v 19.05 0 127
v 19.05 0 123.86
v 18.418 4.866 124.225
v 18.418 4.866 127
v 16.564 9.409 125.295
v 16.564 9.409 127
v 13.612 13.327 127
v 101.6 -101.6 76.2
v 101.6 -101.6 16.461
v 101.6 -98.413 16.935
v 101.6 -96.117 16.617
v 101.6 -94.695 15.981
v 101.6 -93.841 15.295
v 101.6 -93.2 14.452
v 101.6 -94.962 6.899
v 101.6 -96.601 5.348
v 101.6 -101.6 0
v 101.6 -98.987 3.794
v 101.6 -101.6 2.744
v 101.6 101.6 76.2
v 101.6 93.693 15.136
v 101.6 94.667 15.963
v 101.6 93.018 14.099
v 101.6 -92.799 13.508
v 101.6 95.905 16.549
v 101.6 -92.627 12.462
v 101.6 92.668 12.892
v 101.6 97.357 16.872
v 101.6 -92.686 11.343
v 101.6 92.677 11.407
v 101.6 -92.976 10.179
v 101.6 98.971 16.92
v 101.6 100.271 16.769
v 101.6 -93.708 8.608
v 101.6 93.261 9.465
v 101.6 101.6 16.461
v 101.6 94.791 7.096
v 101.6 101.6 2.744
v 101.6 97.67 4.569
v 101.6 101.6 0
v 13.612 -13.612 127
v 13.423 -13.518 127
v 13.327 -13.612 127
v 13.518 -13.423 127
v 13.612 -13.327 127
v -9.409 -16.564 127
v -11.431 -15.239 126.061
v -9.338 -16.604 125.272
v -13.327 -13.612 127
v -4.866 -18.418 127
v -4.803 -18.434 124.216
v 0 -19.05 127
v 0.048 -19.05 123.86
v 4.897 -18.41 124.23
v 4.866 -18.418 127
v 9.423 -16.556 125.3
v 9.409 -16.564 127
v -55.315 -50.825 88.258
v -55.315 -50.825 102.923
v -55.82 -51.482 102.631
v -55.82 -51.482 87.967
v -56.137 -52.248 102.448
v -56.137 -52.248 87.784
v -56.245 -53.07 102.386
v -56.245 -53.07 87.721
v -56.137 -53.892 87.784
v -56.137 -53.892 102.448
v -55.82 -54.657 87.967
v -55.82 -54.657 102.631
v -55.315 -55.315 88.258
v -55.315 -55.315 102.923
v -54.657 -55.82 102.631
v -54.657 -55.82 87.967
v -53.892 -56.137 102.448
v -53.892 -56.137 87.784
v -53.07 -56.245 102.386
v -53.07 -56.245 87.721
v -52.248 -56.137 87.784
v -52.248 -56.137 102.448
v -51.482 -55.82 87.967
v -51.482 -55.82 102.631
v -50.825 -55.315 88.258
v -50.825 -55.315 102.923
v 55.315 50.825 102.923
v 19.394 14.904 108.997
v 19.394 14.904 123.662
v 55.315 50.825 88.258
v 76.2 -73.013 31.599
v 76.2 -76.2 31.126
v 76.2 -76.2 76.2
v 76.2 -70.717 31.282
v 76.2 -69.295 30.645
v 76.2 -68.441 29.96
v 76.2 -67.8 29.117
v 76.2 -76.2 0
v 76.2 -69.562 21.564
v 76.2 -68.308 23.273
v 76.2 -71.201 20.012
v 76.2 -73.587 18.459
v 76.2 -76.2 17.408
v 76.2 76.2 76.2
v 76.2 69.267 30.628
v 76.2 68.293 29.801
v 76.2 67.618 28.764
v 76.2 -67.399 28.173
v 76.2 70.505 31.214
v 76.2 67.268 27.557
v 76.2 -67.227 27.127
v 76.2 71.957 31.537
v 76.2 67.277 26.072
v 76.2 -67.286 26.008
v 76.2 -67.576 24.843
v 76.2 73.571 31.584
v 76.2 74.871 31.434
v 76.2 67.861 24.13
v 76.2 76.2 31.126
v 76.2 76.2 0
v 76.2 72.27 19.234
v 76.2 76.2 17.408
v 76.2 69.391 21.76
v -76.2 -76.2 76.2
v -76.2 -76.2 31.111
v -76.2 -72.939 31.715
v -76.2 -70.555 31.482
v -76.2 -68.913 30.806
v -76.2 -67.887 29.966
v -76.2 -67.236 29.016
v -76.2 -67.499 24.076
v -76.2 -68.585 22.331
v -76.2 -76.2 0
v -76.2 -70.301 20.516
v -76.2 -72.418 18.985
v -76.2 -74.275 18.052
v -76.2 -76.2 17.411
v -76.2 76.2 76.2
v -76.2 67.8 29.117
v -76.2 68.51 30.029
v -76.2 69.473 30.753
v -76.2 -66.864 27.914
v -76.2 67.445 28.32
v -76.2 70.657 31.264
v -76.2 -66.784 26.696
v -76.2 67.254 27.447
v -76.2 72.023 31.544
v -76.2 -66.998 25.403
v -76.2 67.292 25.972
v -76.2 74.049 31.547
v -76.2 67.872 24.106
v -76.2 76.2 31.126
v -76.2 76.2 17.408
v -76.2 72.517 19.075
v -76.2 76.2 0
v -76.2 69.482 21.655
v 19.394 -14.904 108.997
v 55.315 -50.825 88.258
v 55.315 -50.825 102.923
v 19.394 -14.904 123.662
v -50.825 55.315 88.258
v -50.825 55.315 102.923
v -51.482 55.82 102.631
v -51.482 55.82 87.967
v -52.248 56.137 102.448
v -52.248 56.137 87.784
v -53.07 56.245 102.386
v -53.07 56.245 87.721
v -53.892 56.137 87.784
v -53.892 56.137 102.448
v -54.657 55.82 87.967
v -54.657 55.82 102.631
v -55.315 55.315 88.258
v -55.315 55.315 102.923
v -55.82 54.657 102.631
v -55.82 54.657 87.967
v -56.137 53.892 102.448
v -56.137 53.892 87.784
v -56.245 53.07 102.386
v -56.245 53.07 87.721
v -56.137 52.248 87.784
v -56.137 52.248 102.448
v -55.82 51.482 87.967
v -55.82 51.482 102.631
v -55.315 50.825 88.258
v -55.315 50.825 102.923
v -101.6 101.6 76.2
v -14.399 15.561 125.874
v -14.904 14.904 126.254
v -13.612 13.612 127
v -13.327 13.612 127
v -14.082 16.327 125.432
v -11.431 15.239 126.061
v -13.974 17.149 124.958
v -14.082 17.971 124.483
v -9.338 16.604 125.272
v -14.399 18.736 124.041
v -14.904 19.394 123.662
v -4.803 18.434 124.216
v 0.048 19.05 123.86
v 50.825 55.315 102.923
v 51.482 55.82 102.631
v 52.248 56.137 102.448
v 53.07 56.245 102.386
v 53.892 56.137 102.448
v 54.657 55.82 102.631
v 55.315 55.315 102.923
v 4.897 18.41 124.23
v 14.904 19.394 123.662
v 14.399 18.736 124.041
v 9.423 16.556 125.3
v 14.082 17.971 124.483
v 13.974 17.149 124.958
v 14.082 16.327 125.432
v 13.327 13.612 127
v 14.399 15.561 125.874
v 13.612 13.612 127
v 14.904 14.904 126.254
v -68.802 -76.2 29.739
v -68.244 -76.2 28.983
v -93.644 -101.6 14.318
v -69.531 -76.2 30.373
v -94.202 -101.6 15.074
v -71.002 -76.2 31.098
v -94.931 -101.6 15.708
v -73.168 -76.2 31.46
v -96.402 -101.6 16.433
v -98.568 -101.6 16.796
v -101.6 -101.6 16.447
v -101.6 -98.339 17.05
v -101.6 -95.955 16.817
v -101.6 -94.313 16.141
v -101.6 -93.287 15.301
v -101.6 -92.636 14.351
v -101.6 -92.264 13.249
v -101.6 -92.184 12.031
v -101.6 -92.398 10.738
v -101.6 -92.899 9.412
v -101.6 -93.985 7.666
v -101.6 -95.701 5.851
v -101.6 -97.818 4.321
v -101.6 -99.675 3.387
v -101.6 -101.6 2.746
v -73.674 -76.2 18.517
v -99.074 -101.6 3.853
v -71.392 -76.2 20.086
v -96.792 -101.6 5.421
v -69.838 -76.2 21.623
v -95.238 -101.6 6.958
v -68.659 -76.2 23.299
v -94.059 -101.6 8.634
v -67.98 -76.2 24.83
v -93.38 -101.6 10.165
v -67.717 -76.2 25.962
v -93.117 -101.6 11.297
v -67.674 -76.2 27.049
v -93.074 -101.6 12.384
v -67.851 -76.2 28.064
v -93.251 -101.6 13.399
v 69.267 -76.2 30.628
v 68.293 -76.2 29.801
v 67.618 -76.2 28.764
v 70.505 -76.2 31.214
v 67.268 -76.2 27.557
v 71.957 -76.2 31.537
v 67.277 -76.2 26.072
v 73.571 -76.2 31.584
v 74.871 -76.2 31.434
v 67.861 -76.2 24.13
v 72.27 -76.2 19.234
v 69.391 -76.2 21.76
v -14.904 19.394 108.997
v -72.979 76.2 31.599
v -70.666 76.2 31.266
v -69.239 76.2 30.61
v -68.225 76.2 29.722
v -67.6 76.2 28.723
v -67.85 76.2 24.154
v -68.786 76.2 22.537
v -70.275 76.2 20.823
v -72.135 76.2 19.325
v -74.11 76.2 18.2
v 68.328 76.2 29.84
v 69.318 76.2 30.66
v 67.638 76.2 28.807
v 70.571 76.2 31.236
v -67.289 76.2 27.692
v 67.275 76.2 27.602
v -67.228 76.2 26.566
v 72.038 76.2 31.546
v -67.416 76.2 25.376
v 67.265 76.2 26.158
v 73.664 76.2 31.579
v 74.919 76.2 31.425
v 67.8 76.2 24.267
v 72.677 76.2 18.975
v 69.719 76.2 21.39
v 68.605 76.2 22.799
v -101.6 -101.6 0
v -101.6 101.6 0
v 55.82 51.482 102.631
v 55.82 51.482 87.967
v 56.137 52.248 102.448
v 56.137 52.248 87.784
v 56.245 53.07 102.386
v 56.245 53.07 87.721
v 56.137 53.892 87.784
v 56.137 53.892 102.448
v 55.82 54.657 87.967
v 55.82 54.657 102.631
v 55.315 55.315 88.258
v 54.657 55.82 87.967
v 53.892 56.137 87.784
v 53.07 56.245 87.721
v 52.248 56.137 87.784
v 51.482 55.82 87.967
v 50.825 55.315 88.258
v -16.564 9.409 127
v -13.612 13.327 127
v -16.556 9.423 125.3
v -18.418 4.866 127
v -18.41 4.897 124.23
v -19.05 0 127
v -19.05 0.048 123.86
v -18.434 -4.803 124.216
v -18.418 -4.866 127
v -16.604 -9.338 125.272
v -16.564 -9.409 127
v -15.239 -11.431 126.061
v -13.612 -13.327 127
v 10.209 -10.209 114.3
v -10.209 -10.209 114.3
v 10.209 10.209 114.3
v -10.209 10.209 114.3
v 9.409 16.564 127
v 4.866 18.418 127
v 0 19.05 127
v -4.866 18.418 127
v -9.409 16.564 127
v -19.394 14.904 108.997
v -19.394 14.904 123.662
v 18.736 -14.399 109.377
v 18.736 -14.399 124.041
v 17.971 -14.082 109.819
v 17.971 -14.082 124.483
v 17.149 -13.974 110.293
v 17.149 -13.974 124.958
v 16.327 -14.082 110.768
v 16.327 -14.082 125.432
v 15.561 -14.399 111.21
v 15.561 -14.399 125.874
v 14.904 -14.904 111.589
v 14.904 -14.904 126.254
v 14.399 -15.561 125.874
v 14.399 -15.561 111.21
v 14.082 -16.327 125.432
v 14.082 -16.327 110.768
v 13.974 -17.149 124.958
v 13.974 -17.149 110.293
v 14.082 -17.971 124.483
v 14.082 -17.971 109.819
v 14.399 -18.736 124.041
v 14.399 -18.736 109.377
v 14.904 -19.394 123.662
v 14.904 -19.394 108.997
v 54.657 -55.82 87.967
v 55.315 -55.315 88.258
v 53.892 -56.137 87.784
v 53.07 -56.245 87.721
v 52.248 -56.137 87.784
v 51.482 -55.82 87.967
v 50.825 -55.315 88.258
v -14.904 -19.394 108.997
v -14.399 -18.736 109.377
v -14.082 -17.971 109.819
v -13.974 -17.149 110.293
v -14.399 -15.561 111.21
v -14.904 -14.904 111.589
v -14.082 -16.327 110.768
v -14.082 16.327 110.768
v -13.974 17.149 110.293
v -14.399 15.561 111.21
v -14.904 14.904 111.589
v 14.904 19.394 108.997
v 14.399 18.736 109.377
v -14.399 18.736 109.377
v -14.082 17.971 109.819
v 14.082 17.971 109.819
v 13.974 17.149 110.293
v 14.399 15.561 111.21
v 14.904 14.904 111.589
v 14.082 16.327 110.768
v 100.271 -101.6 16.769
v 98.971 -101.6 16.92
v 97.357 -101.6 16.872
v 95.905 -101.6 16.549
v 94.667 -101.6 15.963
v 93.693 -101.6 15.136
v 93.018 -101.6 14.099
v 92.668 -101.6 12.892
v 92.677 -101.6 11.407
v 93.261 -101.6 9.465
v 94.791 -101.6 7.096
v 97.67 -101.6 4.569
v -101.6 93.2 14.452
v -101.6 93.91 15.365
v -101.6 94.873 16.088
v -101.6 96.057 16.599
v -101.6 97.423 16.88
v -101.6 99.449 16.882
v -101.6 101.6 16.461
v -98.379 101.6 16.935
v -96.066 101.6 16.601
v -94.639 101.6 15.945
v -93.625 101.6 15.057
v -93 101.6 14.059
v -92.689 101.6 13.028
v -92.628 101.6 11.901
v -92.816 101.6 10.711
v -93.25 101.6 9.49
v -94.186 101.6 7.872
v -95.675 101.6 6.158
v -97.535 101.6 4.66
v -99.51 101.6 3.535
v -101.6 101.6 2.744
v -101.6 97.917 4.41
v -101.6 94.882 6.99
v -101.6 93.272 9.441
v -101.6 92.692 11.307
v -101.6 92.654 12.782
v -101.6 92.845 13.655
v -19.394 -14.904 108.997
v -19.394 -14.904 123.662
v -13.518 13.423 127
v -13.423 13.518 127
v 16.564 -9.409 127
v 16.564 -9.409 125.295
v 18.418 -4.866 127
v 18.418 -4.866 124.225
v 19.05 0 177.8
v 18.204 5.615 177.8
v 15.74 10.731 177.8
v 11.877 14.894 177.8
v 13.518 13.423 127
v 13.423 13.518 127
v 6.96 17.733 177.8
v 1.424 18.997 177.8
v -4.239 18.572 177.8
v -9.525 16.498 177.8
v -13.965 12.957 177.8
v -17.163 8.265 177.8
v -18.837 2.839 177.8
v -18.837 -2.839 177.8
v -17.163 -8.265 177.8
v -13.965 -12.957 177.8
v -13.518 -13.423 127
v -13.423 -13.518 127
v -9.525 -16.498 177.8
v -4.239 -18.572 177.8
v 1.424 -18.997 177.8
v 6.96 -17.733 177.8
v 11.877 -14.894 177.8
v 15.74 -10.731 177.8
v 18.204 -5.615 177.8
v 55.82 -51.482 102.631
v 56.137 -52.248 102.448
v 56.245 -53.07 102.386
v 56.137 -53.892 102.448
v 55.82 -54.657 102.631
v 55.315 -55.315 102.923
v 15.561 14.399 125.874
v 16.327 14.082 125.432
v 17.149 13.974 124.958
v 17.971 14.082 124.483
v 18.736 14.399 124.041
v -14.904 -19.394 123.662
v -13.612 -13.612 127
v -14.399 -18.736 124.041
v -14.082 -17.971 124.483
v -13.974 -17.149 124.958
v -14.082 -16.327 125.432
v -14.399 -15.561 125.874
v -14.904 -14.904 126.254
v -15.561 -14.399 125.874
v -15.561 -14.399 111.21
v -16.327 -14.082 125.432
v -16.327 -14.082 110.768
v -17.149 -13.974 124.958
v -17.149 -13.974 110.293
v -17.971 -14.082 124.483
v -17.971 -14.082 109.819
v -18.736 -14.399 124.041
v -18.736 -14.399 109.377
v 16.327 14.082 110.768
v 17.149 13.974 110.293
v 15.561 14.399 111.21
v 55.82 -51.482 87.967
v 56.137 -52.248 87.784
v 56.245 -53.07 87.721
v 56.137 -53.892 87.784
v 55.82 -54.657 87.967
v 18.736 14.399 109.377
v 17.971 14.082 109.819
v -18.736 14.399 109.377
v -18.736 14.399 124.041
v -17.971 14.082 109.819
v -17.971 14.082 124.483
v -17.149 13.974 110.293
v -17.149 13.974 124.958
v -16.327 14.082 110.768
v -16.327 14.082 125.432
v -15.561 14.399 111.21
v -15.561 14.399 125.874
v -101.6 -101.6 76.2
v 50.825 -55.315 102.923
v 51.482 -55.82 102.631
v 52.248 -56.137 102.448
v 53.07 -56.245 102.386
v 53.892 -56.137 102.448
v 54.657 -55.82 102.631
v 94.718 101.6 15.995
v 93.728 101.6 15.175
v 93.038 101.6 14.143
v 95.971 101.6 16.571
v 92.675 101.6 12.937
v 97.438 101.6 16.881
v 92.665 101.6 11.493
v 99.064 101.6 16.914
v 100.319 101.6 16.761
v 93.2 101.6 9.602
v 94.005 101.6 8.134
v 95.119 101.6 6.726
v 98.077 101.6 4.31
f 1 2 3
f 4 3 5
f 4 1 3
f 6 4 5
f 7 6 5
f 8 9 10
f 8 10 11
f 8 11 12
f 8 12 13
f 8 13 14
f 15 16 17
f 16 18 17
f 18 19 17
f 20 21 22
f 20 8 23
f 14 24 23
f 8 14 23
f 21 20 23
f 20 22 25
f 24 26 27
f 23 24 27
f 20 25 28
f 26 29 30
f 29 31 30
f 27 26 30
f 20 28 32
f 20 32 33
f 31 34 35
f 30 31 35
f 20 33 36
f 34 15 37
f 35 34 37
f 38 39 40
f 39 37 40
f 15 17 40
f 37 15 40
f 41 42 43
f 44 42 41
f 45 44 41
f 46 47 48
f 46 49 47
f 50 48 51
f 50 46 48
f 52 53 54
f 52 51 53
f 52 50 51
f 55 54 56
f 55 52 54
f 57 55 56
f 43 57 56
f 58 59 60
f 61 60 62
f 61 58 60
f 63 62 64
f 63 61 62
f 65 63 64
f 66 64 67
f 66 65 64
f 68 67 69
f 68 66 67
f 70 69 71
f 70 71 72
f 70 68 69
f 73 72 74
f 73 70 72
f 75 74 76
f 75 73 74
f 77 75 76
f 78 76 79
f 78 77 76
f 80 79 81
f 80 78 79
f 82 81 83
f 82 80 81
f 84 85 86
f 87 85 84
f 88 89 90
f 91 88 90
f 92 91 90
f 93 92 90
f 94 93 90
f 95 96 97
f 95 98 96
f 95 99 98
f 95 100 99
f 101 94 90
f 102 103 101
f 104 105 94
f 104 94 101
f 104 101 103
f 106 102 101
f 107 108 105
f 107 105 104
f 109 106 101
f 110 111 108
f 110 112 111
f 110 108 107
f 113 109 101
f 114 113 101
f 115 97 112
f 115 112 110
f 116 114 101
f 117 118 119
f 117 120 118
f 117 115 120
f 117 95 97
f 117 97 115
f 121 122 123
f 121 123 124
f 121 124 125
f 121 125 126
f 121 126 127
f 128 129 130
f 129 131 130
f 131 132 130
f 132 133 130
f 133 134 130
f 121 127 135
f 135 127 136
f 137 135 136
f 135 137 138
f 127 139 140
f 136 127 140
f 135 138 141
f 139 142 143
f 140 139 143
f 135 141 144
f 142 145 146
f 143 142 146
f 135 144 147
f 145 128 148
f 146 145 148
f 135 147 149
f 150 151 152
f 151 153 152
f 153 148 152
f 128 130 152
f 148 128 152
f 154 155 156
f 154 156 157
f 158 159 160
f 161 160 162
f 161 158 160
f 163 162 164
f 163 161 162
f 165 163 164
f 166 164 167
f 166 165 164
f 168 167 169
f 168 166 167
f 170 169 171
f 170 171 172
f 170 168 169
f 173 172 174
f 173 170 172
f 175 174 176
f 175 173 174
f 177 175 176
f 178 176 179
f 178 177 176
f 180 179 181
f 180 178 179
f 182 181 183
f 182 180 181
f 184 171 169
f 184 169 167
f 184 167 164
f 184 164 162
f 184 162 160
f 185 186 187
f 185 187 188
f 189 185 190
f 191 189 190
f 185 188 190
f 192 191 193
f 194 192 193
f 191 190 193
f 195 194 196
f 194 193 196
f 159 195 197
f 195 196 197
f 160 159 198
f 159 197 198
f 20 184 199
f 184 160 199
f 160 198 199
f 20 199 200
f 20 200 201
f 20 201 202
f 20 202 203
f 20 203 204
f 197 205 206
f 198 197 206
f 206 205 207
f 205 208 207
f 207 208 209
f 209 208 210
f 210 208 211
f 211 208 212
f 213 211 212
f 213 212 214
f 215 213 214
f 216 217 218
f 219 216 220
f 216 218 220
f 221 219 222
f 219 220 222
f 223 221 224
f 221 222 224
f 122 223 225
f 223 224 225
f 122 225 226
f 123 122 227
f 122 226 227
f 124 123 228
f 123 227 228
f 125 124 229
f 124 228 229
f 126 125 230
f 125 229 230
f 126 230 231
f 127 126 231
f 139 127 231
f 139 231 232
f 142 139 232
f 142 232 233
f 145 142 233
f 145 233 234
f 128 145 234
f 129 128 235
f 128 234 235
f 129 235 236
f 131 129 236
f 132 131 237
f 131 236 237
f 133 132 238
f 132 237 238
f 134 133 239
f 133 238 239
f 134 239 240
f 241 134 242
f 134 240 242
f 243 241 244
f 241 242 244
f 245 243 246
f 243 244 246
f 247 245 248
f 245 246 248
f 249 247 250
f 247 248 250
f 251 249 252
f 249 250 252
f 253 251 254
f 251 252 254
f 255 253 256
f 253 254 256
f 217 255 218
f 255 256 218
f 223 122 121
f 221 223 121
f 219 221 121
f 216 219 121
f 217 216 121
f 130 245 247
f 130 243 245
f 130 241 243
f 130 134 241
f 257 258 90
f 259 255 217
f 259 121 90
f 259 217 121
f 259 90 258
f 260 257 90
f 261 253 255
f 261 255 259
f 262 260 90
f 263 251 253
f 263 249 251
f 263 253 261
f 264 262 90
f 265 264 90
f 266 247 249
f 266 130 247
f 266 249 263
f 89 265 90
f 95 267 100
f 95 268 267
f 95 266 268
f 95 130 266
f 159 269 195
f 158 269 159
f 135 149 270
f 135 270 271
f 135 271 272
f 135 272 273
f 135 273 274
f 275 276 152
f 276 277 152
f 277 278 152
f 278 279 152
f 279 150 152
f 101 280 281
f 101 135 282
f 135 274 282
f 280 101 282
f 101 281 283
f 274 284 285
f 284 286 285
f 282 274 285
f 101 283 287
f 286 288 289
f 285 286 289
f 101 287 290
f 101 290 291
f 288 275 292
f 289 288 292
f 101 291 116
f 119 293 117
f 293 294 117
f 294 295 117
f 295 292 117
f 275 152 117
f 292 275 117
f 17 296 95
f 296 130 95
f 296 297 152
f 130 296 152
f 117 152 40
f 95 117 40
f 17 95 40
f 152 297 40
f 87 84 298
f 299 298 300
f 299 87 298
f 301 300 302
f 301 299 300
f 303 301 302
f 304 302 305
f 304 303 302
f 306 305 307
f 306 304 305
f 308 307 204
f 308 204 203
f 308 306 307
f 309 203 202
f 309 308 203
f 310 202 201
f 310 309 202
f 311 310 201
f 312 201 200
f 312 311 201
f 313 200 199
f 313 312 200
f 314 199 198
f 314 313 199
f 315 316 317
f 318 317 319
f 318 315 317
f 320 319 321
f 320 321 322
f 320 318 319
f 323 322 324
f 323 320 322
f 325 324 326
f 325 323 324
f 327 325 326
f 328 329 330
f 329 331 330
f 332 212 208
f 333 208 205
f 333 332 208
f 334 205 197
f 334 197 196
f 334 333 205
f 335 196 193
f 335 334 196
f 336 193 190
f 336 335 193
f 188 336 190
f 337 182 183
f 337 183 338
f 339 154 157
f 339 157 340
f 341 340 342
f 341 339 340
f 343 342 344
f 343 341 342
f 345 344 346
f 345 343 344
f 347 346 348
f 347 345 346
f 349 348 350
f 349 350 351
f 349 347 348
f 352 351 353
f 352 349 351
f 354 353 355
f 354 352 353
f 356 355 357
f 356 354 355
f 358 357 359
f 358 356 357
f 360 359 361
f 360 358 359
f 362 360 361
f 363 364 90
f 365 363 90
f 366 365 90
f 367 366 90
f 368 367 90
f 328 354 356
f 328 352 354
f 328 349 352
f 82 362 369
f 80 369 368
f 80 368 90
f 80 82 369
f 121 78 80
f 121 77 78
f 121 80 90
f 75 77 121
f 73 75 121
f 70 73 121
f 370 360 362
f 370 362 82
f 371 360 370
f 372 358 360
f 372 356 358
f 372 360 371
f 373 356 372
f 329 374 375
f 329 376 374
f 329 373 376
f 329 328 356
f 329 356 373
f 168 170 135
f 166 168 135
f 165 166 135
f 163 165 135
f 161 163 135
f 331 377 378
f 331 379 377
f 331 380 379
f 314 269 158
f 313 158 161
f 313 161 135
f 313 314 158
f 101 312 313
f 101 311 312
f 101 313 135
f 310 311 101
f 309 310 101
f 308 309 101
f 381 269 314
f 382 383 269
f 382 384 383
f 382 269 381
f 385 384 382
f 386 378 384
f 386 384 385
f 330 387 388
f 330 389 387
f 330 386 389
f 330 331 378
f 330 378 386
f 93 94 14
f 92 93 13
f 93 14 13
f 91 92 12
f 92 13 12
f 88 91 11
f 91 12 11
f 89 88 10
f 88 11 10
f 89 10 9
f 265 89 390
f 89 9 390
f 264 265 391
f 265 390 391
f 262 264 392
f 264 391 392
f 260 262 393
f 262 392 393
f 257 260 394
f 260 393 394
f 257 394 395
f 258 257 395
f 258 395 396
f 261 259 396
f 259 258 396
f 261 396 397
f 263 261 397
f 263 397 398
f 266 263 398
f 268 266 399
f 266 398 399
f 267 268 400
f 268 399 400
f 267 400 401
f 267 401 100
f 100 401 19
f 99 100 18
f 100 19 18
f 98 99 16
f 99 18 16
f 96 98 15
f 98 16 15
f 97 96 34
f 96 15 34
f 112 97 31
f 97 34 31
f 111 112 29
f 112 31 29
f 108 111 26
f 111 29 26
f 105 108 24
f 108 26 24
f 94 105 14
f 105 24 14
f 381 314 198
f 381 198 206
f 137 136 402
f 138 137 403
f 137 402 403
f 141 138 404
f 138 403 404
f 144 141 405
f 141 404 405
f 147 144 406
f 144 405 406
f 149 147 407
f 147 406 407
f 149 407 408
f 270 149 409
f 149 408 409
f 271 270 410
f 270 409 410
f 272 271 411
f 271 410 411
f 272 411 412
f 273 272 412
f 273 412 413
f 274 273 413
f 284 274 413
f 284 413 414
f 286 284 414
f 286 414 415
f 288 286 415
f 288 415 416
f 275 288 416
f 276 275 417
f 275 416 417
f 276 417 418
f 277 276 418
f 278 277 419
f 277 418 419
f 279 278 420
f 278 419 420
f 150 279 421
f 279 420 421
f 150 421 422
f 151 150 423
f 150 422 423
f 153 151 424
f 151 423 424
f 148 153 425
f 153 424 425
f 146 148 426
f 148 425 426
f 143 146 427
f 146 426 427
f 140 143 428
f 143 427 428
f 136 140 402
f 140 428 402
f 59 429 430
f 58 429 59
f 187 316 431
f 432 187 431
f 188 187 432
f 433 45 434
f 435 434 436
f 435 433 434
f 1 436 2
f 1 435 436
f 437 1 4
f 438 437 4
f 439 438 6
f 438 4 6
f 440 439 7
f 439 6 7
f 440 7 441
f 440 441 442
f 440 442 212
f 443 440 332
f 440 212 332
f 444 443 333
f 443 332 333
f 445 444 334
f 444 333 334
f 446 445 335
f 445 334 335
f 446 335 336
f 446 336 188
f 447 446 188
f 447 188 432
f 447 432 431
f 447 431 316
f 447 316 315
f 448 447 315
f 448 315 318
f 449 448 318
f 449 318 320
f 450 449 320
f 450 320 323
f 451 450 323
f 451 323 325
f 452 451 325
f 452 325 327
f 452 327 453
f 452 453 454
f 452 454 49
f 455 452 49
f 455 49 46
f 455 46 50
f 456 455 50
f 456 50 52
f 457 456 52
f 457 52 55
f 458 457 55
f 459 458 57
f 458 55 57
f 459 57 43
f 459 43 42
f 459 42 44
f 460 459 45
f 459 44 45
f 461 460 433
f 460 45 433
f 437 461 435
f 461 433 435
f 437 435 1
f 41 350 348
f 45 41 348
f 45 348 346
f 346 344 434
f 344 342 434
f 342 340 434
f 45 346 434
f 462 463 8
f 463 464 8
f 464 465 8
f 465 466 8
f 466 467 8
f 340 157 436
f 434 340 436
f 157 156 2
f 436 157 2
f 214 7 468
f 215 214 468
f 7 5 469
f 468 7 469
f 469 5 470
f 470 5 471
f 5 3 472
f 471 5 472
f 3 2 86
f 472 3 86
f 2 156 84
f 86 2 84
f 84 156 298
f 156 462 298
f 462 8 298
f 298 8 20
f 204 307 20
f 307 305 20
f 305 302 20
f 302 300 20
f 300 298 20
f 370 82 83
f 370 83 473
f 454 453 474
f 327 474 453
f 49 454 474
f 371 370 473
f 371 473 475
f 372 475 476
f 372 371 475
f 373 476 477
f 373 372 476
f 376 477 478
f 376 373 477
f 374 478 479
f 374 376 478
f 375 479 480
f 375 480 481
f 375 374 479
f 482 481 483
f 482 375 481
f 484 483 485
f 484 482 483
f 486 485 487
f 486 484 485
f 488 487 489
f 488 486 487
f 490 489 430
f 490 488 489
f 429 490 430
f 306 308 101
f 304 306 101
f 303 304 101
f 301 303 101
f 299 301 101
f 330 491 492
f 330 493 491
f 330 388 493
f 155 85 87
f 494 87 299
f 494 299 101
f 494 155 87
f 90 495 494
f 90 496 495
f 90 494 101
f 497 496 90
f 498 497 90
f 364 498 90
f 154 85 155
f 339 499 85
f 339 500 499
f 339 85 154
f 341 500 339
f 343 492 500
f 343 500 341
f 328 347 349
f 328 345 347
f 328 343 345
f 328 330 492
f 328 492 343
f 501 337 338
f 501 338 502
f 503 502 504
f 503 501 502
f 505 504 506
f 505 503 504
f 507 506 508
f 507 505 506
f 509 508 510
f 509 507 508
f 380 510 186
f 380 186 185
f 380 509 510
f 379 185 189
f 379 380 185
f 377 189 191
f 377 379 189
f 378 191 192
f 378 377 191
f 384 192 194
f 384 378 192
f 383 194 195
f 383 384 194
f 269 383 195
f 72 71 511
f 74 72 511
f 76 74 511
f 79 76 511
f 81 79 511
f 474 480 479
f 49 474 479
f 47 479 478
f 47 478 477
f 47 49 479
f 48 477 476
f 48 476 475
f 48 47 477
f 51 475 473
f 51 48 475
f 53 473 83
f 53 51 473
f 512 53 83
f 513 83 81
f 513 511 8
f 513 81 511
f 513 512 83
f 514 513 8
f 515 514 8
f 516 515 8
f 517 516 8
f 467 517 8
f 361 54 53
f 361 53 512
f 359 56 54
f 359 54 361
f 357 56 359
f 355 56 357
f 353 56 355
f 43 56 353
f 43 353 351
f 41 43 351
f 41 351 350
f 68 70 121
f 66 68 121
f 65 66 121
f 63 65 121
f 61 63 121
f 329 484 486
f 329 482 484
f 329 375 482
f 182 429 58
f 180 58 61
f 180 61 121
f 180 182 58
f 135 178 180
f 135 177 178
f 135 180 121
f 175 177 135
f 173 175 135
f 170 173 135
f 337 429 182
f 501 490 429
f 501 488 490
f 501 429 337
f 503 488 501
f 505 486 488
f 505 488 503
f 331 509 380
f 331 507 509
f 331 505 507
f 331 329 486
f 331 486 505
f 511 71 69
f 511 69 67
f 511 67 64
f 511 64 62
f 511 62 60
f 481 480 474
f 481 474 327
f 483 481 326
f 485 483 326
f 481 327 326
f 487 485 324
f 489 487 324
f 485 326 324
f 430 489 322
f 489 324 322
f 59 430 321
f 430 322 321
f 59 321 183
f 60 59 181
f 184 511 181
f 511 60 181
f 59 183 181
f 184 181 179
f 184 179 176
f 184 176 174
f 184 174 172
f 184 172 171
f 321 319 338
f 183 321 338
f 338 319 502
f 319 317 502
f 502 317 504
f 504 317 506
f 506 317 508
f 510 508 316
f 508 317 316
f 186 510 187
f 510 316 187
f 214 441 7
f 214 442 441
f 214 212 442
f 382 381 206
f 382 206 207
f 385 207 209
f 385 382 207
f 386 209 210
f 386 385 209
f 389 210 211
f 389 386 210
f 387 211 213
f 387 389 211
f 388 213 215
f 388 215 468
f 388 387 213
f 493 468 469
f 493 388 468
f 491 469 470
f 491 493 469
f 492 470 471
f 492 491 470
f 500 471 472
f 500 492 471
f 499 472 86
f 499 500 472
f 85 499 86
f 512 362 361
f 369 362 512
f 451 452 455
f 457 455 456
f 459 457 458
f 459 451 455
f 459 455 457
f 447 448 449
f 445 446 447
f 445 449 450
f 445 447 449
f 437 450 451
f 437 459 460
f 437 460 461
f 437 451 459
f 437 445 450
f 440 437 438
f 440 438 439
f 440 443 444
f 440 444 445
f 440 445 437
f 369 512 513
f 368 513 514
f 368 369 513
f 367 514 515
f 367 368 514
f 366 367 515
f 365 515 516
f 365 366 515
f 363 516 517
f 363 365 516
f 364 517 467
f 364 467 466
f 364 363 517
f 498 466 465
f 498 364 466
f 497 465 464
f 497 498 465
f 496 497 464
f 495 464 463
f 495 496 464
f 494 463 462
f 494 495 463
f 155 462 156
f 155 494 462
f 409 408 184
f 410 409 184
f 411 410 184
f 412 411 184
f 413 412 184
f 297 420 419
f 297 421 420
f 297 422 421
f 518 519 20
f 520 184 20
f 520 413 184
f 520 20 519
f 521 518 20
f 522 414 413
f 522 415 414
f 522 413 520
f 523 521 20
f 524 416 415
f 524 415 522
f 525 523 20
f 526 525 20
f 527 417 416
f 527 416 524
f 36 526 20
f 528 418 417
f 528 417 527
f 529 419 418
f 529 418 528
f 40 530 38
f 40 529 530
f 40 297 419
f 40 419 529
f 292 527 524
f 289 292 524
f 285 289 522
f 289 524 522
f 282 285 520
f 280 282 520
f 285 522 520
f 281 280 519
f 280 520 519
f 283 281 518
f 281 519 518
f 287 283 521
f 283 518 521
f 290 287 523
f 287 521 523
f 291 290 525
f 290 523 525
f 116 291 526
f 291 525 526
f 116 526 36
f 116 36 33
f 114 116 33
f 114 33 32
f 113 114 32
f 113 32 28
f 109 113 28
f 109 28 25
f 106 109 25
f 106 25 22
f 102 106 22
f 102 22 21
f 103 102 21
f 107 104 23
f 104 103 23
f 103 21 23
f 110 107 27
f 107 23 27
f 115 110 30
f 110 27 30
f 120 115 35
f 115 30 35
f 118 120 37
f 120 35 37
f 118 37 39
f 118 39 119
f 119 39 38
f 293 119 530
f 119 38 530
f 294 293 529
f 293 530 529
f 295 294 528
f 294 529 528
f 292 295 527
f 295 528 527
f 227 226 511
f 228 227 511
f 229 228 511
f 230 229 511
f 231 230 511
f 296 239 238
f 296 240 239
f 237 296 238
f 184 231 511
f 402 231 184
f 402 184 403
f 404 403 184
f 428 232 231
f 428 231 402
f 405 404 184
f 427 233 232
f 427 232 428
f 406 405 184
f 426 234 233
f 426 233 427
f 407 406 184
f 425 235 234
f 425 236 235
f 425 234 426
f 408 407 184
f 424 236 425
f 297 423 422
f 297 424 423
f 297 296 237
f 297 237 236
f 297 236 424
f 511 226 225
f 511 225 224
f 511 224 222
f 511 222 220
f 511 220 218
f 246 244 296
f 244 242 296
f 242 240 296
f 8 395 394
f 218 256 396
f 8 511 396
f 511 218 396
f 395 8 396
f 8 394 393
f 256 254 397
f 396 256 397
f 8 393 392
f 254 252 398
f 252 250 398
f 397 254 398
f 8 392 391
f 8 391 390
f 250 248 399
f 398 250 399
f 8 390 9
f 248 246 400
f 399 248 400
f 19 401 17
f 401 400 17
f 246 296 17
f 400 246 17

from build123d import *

# Parameters (mm, degrees)
F0_W           = 203.2
F0_H           = 203.2
F1_DEPTH       = 127
F2_W           = 152.4
F2_H           = 152.4
F3_DEPTH       = 76.2
F4_W           = 152.4
F4_H           = 152.4
F6_C1_SIZE2    = 87.9881810245
F6_C1_SIZE     = 50.8
F6_C2_SIZE2    = 87.9881810245
F6_C2_SIZE     = 50.8
F6_C3_SIZE2    = 50.8
F6_C3_SIZE     = 87.9881810245
F6_C4_SIZE2    = 87.9881810245
F6_C4_SIZE     = 50.8
F8_DEPTH       = 127
F10_R          = 6.35
F11_DEPTH      = 76.2
F15_R          = 6.35
F16_DEPTH      = 127
F17_R          = 6.35
F18_DEPTH      = 127
F19_R          = 6.35
F20_DEPTH      = 127
F21_R          = 19.05
F22_DEPTH      = 50.8
F22_DEPTH_BACK = 12.7


# Not quite as in the source:
# - an extrude whose draft closes it to a point is written as a loft to that point


with BuildPart() as f1:
    # F0 (on Top) → F1 (new body)
    with BuildSketch(Plane.XY):
        Rectangle(F0_W, F0_H)
    extrude(amount=F1_DEPTH)

    # F2 (on face) → F3 (cut)
    with BuildSketch(Plane.XY):
        Rectangle(F2_W, F2_H)
    extrude(amount=F3_DEPTH, mode=Mode.SUBTRACT)

    # F4 (on face) → F5 section 0
    with BuildSketch(Plane(origin=(0, 0, 76.2), x_dir=(1, 0, 0), z_dir=(0, 0, -1)), mode=Mode.PRIVATE) as f5_s0:
        Rectangle(F4_W, F4_H)
    loft([f5_s0.sketch, Vertex(0, 0, 120.1940905122)], ruled=True, mode=Mode.SUBTRACT)

    # F6: chamfer of 50.8 x 87.9881810245 on 4 edges, made by hand

    # F6_c1
    f6_c1_edges = [f1.edges().sort_by_distance(p)[0] for p in [
        (0, -101.6, 127),
    ]]
    f6_c1_side = f1.faces().sort_by_distance((0, -101.6, 125.984))[0]
    chamfer(f6_c1_edges, length=F6_C1_SIZE, length2=F6_C1_SIZE2, reference=f6_c1_side)

    # F6_c2
    f6_c2_edges = [f1.edges().sort_by_distance(p)[0] for p in [
        (-101.6, 43.9940905122, 127),
    ]]
    f6_c2_side = f1.faces().sort_by_distance((-101.6, 43.9940905122, 125.984))[0]
    chamfer(f6_c2_edges, length=F6_C2_SIZE, length2=F6_C2_SIZE2, reference=f6_c2_side)

    # F6_c3
    f6_c3_edges = [f1.edges().sort_by_distance(p)[0] for p in [
        (101.6, 43.9940905122, 127),
    ]]
    f6_c3_side = f1.faces().sort_by_distance((100.584, 43.9940905122, 127))[0]
    chamfer(f6_c3_edges, length=F6_C3_SIZE, length2=F6_C3_SIZE2, reference=f6_c3_side)

    # F6_c4
    f6_c4_edges = [f1.edges().sort_by_distance(p)[0] for p in [
        (0, 101.6, 127),
    ]]
    f6_c4_side = f1.faces().sort_by_distance((0, 101.6, 125.984))[0]
    chamfer(f6_c4_edges, length=F6_C4_SIZE, length2=F6_C4_SIZE2, reference=f6_c4_side)

    # F7 (on Top) → F8 (cut, through all)
    with BuildSketch(Plane.XY):
        with BuildLine():
            Line((-19.3939794208, -14.9038513603), (-55.3150039051, -50.8248758446))
            ThreePointArc((-55.3150039051, -50.8248758446), (-55.3150039051, -55.3150039051), (-50.8248758446, -55.3150039051))
            Line((-50.8248758446, -55.3150039051), (-14.9038513603, -19.3939794208))
            ThreePointArc((-14.9038513603, -19.3939794208), (-14.9038513603, -14.9038513603), (-19.3939794208, -14.9038513603))
        make_face()
        with BuildLine():
            Line((-55.3150039051, 50.8248758446), (-19.3939794208, 14.9038513603))
            ThreePointArc((-19.3939794208, 14.9038513603), (-14.9038513603, 14.9038513603), (-14.9038513603, 19.3939794208))
            Line((-14.9038513603, 19.3939794208), (-50.8248758446, 55.3150039051))
            ThreePointArc((-50.8248758446, 55.3150039051), (-55.3150039051, 55.3150039051), (-55.3150039051, 50.8248758446))
        make_face()
        with BuildLine():
            Line((50.8248758446, 55.3150039051), (14.9038513603, 19.3939794208))
            ThreePointArc((14.9038513603, 19.3939794208), (14.9038513603, 14.9038513603), (19.3939794208, 14.9038513603))
            Line((19.3939794208, 14.9038513603), (55.3150039051, 50.8248758446))
            ThreePointArc((55.3150039051, 50.8248758446), (55.3150039051, 55.3150039051), (50.8248758446, 55.3150039051))
        make_face()
        with BuildLine():
            Line((55.3150039051, -50.8248758446), (19.3939794208, -14.9038513603))
            ThreePointArc((19.3939794208, -14.9038513603), (14.9038513603, -14.9038513603), (14.9038513603, -19.3939794208))
            Line((14.9038513603, -19.3939794208), (50.8248758446, -55.3150039051))
            ThreePointArc((50.8248758446, -55.3150039051), (55.3150039051, -55.3150039051), (55.3150039051, -50.8248758446))
        make_face()
    extrude(amount=F8_DEPTH, mode=Mode.SUBTRACT)

    # F10 (on face) → F11 (cut)
    with BuildSketch(Plane(origin=(87.0857142857, -87.0857142857, -50.2789605854), x_dir=(0.755928946, 0.5669467095, 0.3273268354), z_dir=(0.6546536707, -0.6546536707, -0.377964473))):
        with Locations((22.3436848712, 59.1158335421)):
            Circle(F10_R)
    extrude(amount=-F11_DEPTH, mode=Mode.SUBTRACT)

    # F15 (on face) → F16 (cut)
    with BuildSketch(Plane(origin=(-87.0857142857, -87.0857142857, -50.2789605854), x_dir=(0.5669467095, -0.755928946, 0.3273268354), z_dir=(-0.6546536707, -0.6546536707, -0.377964473))):
        with Locations((22.0481136328, 59.221623296)):
            Circle(F15_R)
    extrude(amount=-F16_DEPTH, mode=Mode.SUBTRACT)

    # F17 (on face) → F18 (cut)
    with BuildSketch(Plane(origin=(-87.0857142857, 87.0857142857, -50.2789605854), x_dir=(-0.755928946, -0.5669467095, 0.3273268354), z_dir=(-0.6546536707, 0.6546536707, -0.377964473))):
        with Locations((22.3436848712, 59.1158335421)):
            Circle(F17_R)
    extrude(amount=-F18_DEPTH, mode=Mode.SUBTRACT)

    # F19 (on face) → F20 (cut)
    with BuildSketch(Plane(origin=(87.0857142857, 87.0857142857, -50.2789605854), x_dir=(-0.755928946, 0.5669467095, -0.3273268354), z_dir=(0.6546536707, 0.6546536707, -0.377964473))):
        with Locations((-22.3436848712, 59.1158335421)):
            Circle(F19_R)
    extrude(amount=-F20_DEPTH, mode=Mode.SUBTRACT)

    # F21 (on face) → F22 (join, two sides)
    with BuildSketch(Plane.XY.offset(127)) as f22_sk:
        Circle(F21_R)
    extrude(amount=F22_DEPTH)
    extrude(f22_sk.sketch, amount=-F22_DEPTH_BACK)


solid = f1.part
